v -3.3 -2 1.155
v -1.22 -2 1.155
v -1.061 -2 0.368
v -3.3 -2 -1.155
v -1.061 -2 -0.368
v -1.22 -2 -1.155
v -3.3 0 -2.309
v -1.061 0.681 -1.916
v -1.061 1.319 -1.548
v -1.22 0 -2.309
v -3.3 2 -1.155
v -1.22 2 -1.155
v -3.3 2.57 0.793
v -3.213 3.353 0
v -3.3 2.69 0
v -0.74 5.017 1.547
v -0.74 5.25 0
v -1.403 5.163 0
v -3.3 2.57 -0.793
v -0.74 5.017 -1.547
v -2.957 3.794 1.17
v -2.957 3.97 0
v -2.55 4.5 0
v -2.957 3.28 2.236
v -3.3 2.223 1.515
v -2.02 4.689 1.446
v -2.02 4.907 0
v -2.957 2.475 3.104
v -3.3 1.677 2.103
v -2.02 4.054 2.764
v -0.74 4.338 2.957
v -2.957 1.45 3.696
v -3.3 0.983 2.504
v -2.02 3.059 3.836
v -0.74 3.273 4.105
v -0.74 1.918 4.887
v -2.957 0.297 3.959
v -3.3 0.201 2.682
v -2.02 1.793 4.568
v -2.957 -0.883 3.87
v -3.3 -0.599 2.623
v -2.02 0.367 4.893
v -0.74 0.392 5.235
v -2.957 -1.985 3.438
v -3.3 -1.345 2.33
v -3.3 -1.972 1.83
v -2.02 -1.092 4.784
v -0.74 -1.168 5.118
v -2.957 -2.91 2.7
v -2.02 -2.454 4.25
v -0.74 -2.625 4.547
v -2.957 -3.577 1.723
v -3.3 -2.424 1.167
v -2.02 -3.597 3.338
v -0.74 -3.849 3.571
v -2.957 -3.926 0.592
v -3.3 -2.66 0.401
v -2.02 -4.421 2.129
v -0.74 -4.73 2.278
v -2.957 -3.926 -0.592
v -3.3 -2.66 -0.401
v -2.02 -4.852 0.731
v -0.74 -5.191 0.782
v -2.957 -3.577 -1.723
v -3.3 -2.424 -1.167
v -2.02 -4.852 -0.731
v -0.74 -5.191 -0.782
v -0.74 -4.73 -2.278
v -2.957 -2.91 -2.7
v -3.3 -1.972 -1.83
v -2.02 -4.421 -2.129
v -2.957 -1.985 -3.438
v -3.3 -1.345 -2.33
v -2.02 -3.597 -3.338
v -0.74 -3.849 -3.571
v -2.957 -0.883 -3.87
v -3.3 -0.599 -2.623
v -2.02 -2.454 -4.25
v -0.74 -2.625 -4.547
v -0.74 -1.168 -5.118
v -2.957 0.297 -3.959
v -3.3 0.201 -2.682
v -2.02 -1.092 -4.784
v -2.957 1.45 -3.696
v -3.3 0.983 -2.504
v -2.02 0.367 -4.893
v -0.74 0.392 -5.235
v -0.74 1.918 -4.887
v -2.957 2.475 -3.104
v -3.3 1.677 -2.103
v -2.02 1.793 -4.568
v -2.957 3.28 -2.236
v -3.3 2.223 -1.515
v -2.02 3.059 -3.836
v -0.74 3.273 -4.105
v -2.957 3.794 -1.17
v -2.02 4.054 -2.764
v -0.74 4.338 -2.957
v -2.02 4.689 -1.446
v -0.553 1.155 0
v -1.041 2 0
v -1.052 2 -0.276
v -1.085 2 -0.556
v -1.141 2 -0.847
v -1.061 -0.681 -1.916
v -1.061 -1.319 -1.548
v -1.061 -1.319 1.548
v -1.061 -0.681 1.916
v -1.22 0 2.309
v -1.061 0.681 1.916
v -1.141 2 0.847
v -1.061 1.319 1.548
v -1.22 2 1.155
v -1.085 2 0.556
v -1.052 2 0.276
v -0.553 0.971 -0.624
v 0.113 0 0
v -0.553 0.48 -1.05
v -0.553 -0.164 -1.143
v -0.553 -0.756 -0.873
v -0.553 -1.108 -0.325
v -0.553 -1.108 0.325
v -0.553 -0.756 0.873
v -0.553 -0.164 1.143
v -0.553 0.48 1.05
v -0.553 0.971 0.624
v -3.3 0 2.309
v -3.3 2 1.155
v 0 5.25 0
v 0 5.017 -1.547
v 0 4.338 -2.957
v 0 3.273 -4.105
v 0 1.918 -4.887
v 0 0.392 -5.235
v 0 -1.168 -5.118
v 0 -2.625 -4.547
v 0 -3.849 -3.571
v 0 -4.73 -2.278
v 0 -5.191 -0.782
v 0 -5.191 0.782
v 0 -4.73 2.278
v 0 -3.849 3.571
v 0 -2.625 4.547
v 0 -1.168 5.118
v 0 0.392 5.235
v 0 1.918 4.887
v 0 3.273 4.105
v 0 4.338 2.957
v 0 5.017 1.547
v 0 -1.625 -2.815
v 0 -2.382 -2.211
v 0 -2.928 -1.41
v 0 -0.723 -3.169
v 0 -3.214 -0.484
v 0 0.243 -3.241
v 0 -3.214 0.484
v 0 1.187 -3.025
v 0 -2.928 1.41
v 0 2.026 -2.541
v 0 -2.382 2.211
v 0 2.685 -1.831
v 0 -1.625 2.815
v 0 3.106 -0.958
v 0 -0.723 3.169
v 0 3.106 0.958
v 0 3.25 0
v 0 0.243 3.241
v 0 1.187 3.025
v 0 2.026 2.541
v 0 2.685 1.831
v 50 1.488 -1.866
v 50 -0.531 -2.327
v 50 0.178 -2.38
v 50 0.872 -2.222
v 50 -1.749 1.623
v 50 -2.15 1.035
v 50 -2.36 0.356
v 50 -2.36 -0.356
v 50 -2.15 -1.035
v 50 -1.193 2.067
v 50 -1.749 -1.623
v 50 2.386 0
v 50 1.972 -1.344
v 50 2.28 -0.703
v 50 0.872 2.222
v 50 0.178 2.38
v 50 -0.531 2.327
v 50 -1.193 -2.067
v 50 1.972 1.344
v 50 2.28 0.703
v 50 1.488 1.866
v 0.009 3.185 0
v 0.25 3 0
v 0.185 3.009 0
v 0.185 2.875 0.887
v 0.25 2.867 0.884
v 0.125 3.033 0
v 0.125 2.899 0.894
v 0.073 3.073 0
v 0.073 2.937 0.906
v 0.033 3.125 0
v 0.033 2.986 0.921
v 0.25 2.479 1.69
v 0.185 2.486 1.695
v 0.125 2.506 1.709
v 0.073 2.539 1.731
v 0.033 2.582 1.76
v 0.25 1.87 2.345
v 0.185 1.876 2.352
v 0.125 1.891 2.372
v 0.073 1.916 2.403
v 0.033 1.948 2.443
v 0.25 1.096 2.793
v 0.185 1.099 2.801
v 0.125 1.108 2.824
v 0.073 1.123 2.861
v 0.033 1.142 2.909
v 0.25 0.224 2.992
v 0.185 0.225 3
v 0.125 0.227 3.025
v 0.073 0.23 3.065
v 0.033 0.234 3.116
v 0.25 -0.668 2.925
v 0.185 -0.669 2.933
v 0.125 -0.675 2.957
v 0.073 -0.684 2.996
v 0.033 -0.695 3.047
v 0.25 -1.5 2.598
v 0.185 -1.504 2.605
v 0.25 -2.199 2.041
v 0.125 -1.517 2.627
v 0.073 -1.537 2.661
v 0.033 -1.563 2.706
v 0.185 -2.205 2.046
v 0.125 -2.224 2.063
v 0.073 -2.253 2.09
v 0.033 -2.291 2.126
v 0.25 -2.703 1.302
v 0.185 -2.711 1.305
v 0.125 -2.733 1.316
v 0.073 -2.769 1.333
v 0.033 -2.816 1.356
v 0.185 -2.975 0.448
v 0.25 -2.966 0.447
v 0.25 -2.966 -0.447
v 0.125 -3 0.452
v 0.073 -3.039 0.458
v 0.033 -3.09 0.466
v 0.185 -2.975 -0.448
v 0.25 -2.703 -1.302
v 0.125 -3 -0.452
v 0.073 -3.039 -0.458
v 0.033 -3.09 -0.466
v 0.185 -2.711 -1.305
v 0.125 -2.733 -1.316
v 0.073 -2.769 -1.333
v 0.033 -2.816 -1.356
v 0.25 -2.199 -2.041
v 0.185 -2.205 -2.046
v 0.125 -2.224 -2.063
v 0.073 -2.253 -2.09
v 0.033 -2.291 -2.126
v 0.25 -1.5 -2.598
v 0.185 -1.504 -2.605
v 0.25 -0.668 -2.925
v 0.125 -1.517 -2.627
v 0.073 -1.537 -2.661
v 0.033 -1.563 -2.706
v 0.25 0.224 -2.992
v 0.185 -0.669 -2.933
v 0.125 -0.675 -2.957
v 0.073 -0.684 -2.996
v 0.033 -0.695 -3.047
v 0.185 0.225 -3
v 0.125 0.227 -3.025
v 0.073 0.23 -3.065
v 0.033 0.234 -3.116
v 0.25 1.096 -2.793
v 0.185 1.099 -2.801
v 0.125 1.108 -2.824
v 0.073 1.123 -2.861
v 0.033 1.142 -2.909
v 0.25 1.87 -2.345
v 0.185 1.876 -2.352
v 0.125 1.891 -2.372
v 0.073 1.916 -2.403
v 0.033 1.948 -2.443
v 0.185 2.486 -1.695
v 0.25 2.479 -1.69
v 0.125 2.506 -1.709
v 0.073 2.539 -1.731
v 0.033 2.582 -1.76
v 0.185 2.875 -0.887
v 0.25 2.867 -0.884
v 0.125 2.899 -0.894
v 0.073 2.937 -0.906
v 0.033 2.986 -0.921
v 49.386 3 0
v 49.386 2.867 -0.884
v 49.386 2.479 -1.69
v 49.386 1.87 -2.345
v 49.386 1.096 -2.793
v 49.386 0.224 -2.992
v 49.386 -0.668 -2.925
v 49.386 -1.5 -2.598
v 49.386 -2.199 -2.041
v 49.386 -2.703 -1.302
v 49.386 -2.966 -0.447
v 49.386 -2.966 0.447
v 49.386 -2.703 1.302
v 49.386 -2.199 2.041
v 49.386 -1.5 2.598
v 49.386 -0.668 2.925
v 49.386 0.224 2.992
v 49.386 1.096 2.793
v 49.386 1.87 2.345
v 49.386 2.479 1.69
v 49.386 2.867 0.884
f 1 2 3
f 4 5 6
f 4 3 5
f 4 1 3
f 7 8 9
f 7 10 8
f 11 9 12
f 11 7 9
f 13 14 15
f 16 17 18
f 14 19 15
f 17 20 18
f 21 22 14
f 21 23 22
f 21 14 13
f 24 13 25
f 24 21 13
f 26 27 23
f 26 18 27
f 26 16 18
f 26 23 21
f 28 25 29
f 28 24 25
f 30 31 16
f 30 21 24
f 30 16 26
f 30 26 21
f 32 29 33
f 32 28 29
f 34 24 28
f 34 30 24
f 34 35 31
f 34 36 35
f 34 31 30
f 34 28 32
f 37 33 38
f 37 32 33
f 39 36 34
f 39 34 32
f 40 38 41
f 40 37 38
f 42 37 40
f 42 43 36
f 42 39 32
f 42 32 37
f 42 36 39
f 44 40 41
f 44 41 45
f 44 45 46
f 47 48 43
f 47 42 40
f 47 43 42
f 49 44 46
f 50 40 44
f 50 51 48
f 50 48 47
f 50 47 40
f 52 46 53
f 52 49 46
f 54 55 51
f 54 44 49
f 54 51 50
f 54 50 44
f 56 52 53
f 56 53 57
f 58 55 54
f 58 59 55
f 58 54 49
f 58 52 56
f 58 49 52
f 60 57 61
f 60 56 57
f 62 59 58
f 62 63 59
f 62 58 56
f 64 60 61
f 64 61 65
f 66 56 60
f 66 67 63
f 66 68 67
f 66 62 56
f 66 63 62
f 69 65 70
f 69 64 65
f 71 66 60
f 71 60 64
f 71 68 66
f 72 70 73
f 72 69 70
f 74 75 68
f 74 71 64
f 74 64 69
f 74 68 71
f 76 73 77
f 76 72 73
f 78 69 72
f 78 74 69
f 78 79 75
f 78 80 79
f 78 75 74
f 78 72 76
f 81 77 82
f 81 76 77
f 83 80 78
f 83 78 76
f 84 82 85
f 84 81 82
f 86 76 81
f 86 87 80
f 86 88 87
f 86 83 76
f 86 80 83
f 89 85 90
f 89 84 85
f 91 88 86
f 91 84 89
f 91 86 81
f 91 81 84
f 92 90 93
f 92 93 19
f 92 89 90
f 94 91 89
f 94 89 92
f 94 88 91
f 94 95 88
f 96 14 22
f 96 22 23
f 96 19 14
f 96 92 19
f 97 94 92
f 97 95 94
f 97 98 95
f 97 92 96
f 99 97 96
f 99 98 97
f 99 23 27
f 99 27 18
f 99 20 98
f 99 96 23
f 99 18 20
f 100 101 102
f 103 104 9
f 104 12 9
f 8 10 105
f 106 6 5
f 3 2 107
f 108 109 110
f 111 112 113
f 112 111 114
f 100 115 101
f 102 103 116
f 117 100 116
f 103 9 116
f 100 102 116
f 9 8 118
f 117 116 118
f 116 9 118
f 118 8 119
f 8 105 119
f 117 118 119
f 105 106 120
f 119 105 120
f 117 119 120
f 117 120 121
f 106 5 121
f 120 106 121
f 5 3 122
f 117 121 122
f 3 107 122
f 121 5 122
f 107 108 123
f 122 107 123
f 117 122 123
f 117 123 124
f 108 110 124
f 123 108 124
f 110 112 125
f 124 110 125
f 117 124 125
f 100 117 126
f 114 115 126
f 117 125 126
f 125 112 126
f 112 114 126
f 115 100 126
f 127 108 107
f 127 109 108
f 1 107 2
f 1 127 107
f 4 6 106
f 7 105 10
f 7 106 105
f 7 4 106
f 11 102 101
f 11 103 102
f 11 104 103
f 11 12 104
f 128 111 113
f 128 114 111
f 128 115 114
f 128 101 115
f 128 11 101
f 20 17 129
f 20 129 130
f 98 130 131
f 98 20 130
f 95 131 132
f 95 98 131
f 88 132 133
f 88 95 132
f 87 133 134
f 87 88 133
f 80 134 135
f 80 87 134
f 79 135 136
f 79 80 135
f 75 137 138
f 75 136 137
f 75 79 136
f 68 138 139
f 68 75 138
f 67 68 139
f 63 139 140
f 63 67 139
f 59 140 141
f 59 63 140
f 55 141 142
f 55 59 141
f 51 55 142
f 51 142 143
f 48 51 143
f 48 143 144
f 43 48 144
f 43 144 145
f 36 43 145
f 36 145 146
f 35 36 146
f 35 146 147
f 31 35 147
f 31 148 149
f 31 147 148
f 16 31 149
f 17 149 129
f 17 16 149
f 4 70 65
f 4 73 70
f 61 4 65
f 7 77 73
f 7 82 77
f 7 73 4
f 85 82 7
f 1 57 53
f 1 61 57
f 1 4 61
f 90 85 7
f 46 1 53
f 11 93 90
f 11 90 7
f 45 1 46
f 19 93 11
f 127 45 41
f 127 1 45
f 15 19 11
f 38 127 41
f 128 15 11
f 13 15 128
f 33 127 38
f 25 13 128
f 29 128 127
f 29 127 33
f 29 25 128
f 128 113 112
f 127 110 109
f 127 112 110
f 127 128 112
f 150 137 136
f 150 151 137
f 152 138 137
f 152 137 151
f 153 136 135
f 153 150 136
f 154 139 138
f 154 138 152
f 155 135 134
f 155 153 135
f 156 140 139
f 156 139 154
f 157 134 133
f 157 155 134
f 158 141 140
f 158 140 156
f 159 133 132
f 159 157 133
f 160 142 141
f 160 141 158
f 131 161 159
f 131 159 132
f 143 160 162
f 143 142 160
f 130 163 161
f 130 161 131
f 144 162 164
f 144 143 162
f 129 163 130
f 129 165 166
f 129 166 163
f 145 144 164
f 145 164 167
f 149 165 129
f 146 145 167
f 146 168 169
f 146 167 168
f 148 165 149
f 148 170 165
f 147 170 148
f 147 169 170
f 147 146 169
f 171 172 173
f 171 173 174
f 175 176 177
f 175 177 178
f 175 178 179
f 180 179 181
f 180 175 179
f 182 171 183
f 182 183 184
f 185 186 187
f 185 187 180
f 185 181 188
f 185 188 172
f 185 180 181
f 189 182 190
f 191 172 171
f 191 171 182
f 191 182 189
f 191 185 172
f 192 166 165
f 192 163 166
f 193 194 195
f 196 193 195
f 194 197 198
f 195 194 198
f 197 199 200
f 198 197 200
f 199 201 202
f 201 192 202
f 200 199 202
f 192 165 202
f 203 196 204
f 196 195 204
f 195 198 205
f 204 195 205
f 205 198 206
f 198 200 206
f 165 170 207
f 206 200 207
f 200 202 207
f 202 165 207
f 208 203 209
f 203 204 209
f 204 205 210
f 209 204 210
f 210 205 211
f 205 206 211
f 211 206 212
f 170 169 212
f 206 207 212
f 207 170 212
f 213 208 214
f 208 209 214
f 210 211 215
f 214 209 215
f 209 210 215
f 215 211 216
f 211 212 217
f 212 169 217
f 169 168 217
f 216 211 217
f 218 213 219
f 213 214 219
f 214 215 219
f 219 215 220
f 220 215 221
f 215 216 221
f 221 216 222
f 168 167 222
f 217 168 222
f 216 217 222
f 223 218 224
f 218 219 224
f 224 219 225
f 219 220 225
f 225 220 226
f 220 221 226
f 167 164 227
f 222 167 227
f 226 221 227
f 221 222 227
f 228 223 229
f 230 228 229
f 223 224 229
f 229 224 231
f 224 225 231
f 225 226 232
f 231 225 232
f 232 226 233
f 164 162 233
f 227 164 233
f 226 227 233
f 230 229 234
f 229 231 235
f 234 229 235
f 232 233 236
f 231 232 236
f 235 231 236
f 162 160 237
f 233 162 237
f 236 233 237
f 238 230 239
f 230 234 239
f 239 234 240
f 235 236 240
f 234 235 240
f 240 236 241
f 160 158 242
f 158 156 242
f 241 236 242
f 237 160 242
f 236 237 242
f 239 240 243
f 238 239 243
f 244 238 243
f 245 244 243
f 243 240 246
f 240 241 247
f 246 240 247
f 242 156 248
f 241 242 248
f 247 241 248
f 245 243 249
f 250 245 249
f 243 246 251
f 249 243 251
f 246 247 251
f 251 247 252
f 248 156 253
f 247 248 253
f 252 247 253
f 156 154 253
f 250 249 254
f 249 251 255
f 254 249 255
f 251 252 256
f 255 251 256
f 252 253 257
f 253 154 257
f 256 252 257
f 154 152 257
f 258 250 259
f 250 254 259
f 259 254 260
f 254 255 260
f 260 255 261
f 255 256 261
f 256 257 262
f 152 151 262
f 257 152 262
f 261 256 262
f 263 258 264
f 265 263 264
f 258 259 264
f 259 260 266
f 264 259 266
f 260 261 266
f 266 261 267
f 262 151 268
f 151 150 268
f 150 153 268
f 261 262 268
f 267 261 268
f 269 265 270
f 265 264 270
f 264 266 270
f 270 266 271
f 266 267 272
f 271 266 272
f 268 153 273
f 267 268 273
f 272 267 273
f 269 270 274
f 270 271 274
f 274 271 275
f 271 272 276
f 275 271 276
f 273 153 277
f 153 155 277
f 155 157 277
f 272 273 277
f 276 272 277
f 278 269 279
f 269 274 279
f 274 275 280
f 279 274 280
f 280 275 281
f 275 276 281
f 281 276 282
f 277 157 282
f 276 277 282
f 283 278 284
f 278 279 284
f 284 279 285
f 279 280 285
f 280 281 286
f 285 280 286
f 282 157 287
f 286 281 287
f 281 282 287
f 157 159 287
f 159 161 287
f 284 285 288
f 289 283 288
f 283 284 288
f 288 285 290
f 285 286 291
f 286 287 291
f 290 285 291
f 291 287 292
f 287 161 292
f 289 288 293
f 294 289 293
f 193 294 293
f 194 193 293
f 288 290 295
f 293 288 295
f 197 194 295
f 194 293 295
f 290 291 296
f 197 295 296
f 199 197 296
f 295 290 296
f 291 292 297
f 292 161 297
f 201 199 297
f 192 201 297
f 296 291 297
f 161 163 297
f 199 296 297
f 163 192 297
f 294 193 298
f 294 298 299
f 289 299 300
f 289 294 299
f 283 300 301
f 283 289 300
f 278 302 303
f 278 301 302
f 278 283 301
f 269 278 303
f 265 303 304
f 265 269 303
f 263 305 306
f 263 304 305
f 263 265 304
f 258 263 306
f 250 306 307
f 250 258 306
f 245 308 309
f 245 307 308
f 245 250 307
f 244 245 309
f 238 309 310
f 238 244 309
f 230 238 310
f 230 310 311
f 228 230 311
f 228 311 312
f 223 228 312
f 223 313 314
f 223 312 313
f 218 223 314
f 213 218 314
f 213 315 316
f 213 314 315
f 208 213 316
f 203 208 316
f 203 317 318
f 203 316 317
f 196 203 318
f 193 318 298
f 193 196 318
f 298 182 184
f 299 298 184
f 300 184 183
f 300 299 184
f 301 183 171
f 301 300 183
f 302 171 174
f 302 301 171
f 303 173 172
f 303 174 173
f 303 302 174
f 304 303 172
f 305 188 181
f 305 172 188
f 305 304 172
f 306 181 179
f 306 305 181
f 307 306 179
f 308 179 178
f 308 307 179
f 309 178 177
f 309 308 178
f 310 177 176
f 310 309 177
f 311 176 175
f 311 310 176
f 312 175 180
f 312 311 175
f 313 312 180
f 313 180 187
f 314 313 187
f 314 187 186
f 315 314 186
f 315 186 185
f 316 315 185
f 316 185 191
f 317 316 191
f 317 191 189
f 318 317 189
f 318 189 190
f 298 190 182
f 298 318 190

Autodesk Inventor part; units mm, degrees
ref_plane "YZ Plane" through (0, 0, 0) normal (1, 0, 0) x (0, 1, 0)
ref_plane "XZ Plane" through (0, 0, 0) normal (0, 1, 0) x (-1, 0, 0)
sketch "Sketch1" plane through (0, 0, 0) normal (0, 0, 1) x (1, 0, 0)
  line L0 (0.1133, 0) -> (50, 0)
  line L1 (50, 0) -> (50, 3)
  line L2 (50, 3) -> (26, 3)
  line L3 (26, 3) -> (25.3864, 3)
  line L4 (25.3864, 3) -> (0, 3)
  line L5 (0, 3) -> (0, 5.25)
  line L6 (0, 5.25) -> (-3.3, 5.25)
  line L7 (-3.3, 5.25) -> (-3.3, 2.3094)
  line L8 (-3.3, 2.3094) -> (-1.22, 2.3094)
  line L9 (-1.22, 2.3094) -> (0.1133, 0)
  line L10 (-13.96, 0) -> (60.66, 0) projected
  line L11 (0, -1.05) -> (0, 6.3) projected
  line L12 (26, 3) -> (0, 3) construction
  dimension "d1" = 24
  dimension "d2" = 0.6136
  dimension "d3" = 3.3
  dimension "d4" = 2.08
  dimension "d5" = 60
  dimension "d6" = 6
  dimension "d7" = 6
  dimension "d8" = 4.6188
  dimension "d9" = 10.5
  dimension "d26" = 50
revolve "Body" add sketch "Sketch1" angle 360 about axis through (0.1133, 0, 0) along (1, 0, 0) contours L9 L11 L4 L3 L2 L1 L0 | L9 L8 L7 L6 L5 L11
sketch "Sketch2" plane through (-3.3, 0, 0) normal (-1, 0, 0) x (0, 0, 1)
  circle A0 centre (0, 0) radius 2.3094 projected
  line L0 (0, -7.35) -> (0, 7.35) projected
  line L1 (-7.35, 0) -> (7.35, 0) projected
  line L2 (2.3094, 0) -> (1.1547, -2)
  line L3 (1.1547, -2) -> (-1.1547, -2)
  line L4 (-1.1547, -2) -> (-2.3094, 0)
  line L5 (-2.3094, 0) -> (-1.1547, 2)
  line L6 (-1.1547, 2) -> (1.1547, 2)
  line L7 (1.1547, 2) -> (2.3094, 0)
extrude "Slot" add sketch "Sketch2" against normal up to next contours L7 A0 | A0 L2 | L6 L0 A0 | A0 L0 L3 | L0 L6 A0 | A0 L3 L0 | L4 A0 | A0 L5
fillet "Fillet1" radius 2.56 1 edges at (-3.3, -5.25, 0)
thread "Thread" size "M6x1" class "6g" standard "ISO Metric profile" length 24
chamfer "Chamfer1" distance 0.6135 distance2 0.6135 1 edges at (50, -3, 0) measured on face at (50, -0.7485, -0.2663)
ref_plane "Work Plane1" through (29, 0, 0) normal (0, -1, 0) x (1, 0, 0)
fillet "Fillet2" radius 0.25 1 edges at (0, -3, 0)
equation "\"d1\" = GEL"
equation "\"d3\" = KOH"
equation "\"d4\" = INTI"
equation "\"d6\" = GD"
equation "\"d7\" = BDM"
equation "\"d8\" = 1.1547 * SW"
equation "\"d9\" = KOD"
equation "\"d26\" = NLG"
equation "\"d30\" = R"
equation "\"d17\" = RR"
equation "\"d13\" = GEL"
equation "\"d15\" = -0.5 * SPD + 0.5 * GD"
equation "\"d16\" = GUL"
equation "\"GD\" = NND"
equation "\"NLG\" = 50"
equation "\"GEL\" = 24"
equation "\"KOD\" = 10.5"
equation "\"KOH\" = 3.3"
equation "\"INTI\" = 2.08"
equation "\"GAL\" = 0.61345 * PTC"
equation "\"GUL\" = 0.61345 * PTC"
equation "\"BDM\" = NND"
equation "\"SW\" = 4"
equation "\"RR\" = 2.56"
equation "\"SPD\" = NND - 1.2269 * PTC"
equation "\"R\" = 0.25"
equation "\"TOA\" = 30deg"
equation "\"GD1\" = THREADDIA - 1.2269 * PTC"
equation "\"THREADDIA\" = 6"
equation "\"PTC\" = 1"
equation "\"NND\" = 6"
equation "\"KOH1\" = 0.74"
equation "\"E0\" = 4.583"
properties part number "ISO 7380-1 - M6 x 50" material "Steel"
